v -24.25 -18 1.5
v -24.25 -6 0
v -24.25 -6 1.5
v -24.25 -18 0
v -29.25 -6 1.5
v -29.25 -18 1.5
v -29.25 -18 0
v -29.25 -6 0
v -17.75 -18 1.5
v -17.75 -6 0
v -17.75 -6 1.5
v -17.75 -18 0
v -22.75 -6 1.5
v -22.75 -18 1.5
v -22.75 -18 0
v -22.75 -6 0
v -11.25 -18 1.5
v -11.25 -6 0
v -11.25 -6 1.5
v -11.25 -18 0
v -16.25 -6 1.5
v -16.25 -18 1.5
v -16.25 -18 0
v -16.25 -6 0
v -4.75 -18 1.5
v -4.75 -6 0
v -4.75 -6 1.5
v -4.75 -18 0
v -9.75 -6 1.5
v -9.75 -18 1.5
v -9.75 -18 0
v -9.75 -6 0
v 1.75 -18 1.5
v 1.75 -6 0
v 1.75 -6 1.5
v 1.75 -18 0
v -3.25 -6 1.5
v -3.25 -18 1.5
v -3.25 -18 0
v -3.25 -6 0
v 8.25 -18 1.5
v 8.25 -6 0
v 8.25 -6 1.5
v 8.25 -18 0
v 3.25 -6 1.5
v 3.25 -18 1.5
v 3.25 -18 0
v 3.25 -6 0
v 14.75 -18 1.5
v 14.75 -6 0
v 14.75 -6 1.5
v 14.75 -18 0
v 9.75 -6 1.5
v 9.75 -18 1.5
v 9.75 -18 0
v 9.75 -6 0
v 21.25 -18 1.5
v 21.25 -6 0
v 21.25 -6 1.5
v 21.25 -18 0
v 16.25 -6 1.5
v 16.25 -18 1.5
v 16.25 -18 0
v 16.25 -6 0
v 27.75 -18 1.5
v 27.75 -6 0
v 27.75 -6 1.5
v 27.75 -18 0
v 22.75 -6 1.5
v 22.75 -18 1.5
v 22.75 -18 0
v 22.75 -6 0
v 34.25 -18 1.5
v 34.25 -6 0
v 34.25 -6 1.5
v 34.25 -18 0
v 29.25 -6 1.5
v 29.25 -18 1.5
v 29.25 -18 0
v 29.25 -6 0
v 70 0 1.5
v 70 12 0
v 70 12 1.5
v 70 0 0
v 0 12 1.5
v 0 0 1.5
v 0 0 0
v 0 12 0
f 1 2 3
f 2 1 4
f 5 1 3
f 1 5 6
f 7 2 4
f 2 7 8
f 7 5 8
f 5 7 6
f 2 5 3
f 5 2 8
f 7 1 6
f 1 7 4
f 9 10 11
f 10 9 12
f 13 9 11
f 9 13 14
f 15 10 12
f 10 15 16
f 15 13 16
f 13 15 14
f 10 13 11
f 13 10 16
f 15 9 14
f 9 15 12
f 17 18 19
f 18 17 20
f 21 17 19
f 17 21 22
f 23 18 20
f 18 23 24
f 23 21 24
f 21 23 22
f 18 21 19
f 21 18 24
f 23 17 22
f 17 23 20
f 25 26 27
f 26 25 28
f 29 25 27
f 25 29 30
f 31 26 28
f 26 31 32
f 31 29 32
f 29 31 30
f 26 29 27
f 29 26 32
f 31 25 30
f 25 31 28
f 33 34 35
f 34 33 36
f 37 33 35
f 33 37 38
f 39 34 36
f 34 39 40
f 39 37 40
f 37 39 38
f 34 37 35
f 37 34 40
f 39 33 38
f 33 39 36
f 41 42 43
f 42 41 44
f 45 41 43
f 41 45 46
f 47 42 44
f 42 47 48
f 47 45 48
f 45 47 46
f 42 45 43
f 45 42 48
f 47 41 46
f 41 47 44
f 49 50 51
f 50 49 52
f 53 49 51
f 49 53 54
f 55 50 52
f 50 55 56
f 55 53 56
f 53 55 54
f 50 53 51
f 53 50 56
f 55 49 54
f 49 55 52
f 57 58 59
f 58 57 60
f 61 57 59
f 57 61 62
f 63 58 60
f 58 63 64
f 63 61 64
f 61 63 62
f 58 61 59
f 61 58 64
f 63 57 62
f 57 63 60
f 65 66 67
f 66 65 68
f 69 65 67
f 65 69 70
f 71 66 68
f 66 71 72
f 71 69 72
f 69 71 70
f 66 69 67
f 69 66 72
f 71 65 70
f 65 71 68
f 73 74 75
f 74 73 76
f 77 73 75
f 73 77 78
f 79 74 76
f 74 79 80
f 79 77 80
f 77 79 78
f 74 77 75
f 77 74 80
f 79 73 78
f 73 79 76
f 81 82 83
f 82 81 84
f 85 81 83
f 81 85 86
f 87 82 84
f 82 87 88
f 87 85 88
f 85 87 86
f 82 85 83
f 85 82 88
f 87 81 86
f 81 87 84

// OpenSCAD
// 10-well comb for agarose gel casting
// Print orientation: flat on XY plane, Z = 0

thickness = 1.5;      // mm, comb thickness (Z)
spine_length = 70;    // mm, X direction (length of back bar)
spine_width = 12;     // mm, Y direction (width of back bar)
num_wells = 10;       // number of teeth/wells
tooth_width = 5.0;    // mm, X direction (width of each tooth)
tooth_length = 12;    // mm, Y direction (length of each tooth, hanging down in -Y)
gap_width = 1.5;      // mm, gap between neighbouring teeth

// Calculate total width of teeth + gaps
teeth_row_width = num_wells * tooth_width + (num_wells - 1) * gap_width;

// Spine should extend beyond teeth row on both sides
// Spine length = 70 mm, teeth row width = 63.5 mm
// So spine extends (70 - 63.5)/2 = 3.25 mm beyond on each side
spine_extension = (spine_length - teeth_row_width) / 2;

// Build comb as single solid
module comb() {
    // Back bar (spine) - full length, centered at X=0, Y centered
    translate([0, 0, 0])
        cube([spine_length, spine_width, thickness]);
    
    // Teeth - attached to the bottom edge of spine (Y negative direction)
    // Teeth row is centered on spine in X
    for (i = [0 : num_wells - 1]) {
        // X position of each tooth center (centered on spine)
        tooth_x = -teeth_row_width/2 + i * (tooth_width + gap_width) + tooth_width/2;
        
        // Place tooth: aligned with spine in X, attached at bottom edge of spine in Y
        // Spine Y range: -spine_width/2 to +spine_width/2
        // Tooth Y range: -spine_width/2 - tooth_length to -spine_width/2
        translate([tooth_x, -spine_width/2 - tooth_length, 0])
            cube([tooth_width, tooth_length, thickness]);
    }
}

// Render
comb();
